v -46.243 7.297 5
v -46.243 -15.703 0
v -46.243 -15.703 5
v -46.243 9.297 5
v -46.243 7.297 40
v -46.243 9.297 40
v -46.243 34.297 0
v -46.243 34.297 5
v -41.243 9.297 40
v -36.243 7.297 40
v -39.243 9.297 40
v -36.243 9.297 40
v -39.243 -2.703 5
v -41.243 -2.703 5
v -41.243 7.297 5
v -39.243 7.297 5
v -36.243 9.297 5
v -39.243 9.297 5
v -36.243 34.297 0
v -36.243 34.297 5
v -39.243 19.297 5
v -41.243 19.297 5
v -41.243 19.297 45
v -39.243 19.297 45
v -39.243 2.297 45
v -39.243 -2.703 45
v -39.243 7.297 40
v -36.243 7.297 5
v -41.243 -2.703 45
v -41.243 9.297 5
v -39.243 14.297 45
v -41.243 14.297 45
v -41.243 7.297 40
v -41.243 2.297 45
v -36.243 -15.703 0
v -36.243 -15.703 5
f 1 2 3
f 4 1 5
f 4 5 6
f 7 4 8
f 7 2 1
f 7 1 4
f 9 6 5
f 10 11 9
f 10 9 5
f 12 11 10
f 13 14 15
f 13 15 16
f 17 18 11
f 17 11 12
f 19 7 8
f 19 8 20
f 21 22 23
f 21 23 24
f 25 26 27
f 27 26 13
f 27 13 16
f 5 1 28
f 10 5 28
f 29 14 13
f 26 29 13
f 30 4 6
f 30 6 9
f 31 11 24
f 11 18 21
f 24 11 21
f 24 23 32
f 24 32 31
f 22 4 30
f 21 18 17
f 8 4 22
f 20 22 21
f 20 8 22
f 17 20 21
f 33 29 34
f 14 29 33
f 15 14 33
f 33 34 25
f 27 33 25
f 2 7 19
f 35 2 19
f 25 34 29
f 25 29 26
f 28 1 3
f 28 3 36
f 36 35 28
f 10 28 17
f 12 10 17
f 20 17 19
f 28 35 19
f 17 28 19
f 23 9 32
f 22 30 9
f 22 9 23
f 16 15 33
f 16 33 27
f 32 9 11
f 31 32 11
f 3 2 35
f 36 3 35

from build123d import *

# Parameters (mm, degrees)
F0_W     = 10
F0_H     = 50
F1_DEPTH = 5
F2_W     = 10
F2_H     = 2
F3_DEPTH = 35
F4_W     = 2
F4_H     = 10
F5_DEPTH = 40
F6_W     = 2
F6_H     = 10
F7_DEPTH = 40
F8_SIZE  = 5
F9_SIZE  = 4.99999


# Not quite as in the source:
# - a fillet or chamfer is up to 0.001 mm smaller than in the source, because OpenCascade refuses the exact size


with BuildPart() as f1:
    # F0 (on Top) → F1 (new body)
    with BuildSketch(Plane.XY):
        with Locations((-41.2431620061, 9.2969734803)):
            Rectangle(F0_W, F0_H)
    extrude(amount=F1_DEPTH)

    # F2 (on face) → F3 (join)
    with BuildSketch(Plane.XY.offset(5)):
        with Locations((-41.2431620061, 8.2969734803)):
            Rectangle(F2_W, F2_H)
    extrude(amount=F3_DEPTH)

    # F6 (on face) → F7 (join)
    with BuildSketch(Plane.XY.offset(5)):
        with Locations((-40.2431620061, 14.2969734803)):
            Rectangle(F6_W, F6_H)
    extrude(amount=F7_DEPTH)

    # F9 (size 5 in the source; OpenCascade refuses exactly that, so slightly less here)
    f9_edges = [f1.edges().sort_by_distance(p)[0] for p in [
        (-40.243162, 9.296973, 45),
    ]]
    chamfer(f9_edges, length=F9_SIZE)


with BuildPart() as f5:
    # F4 (on face) → F5 (new body)
    with BuildSketch(Plane.XY.offset(5)):
        with Locations((-40.2431620061, 2.2969734803)):
            Rectangle(F4_W, F4_H)
    extrude(amount=F5_DEPTH)

    # F8
    f8_edges = [f5.edges().sort_by_distance(p)[0] for p in [
        (-40.243162, 7.296973, 45),
    ]]
    chamfer(f8_edges, length=F8_SIZE)


solid = Compound([f1.part, f5.part])
